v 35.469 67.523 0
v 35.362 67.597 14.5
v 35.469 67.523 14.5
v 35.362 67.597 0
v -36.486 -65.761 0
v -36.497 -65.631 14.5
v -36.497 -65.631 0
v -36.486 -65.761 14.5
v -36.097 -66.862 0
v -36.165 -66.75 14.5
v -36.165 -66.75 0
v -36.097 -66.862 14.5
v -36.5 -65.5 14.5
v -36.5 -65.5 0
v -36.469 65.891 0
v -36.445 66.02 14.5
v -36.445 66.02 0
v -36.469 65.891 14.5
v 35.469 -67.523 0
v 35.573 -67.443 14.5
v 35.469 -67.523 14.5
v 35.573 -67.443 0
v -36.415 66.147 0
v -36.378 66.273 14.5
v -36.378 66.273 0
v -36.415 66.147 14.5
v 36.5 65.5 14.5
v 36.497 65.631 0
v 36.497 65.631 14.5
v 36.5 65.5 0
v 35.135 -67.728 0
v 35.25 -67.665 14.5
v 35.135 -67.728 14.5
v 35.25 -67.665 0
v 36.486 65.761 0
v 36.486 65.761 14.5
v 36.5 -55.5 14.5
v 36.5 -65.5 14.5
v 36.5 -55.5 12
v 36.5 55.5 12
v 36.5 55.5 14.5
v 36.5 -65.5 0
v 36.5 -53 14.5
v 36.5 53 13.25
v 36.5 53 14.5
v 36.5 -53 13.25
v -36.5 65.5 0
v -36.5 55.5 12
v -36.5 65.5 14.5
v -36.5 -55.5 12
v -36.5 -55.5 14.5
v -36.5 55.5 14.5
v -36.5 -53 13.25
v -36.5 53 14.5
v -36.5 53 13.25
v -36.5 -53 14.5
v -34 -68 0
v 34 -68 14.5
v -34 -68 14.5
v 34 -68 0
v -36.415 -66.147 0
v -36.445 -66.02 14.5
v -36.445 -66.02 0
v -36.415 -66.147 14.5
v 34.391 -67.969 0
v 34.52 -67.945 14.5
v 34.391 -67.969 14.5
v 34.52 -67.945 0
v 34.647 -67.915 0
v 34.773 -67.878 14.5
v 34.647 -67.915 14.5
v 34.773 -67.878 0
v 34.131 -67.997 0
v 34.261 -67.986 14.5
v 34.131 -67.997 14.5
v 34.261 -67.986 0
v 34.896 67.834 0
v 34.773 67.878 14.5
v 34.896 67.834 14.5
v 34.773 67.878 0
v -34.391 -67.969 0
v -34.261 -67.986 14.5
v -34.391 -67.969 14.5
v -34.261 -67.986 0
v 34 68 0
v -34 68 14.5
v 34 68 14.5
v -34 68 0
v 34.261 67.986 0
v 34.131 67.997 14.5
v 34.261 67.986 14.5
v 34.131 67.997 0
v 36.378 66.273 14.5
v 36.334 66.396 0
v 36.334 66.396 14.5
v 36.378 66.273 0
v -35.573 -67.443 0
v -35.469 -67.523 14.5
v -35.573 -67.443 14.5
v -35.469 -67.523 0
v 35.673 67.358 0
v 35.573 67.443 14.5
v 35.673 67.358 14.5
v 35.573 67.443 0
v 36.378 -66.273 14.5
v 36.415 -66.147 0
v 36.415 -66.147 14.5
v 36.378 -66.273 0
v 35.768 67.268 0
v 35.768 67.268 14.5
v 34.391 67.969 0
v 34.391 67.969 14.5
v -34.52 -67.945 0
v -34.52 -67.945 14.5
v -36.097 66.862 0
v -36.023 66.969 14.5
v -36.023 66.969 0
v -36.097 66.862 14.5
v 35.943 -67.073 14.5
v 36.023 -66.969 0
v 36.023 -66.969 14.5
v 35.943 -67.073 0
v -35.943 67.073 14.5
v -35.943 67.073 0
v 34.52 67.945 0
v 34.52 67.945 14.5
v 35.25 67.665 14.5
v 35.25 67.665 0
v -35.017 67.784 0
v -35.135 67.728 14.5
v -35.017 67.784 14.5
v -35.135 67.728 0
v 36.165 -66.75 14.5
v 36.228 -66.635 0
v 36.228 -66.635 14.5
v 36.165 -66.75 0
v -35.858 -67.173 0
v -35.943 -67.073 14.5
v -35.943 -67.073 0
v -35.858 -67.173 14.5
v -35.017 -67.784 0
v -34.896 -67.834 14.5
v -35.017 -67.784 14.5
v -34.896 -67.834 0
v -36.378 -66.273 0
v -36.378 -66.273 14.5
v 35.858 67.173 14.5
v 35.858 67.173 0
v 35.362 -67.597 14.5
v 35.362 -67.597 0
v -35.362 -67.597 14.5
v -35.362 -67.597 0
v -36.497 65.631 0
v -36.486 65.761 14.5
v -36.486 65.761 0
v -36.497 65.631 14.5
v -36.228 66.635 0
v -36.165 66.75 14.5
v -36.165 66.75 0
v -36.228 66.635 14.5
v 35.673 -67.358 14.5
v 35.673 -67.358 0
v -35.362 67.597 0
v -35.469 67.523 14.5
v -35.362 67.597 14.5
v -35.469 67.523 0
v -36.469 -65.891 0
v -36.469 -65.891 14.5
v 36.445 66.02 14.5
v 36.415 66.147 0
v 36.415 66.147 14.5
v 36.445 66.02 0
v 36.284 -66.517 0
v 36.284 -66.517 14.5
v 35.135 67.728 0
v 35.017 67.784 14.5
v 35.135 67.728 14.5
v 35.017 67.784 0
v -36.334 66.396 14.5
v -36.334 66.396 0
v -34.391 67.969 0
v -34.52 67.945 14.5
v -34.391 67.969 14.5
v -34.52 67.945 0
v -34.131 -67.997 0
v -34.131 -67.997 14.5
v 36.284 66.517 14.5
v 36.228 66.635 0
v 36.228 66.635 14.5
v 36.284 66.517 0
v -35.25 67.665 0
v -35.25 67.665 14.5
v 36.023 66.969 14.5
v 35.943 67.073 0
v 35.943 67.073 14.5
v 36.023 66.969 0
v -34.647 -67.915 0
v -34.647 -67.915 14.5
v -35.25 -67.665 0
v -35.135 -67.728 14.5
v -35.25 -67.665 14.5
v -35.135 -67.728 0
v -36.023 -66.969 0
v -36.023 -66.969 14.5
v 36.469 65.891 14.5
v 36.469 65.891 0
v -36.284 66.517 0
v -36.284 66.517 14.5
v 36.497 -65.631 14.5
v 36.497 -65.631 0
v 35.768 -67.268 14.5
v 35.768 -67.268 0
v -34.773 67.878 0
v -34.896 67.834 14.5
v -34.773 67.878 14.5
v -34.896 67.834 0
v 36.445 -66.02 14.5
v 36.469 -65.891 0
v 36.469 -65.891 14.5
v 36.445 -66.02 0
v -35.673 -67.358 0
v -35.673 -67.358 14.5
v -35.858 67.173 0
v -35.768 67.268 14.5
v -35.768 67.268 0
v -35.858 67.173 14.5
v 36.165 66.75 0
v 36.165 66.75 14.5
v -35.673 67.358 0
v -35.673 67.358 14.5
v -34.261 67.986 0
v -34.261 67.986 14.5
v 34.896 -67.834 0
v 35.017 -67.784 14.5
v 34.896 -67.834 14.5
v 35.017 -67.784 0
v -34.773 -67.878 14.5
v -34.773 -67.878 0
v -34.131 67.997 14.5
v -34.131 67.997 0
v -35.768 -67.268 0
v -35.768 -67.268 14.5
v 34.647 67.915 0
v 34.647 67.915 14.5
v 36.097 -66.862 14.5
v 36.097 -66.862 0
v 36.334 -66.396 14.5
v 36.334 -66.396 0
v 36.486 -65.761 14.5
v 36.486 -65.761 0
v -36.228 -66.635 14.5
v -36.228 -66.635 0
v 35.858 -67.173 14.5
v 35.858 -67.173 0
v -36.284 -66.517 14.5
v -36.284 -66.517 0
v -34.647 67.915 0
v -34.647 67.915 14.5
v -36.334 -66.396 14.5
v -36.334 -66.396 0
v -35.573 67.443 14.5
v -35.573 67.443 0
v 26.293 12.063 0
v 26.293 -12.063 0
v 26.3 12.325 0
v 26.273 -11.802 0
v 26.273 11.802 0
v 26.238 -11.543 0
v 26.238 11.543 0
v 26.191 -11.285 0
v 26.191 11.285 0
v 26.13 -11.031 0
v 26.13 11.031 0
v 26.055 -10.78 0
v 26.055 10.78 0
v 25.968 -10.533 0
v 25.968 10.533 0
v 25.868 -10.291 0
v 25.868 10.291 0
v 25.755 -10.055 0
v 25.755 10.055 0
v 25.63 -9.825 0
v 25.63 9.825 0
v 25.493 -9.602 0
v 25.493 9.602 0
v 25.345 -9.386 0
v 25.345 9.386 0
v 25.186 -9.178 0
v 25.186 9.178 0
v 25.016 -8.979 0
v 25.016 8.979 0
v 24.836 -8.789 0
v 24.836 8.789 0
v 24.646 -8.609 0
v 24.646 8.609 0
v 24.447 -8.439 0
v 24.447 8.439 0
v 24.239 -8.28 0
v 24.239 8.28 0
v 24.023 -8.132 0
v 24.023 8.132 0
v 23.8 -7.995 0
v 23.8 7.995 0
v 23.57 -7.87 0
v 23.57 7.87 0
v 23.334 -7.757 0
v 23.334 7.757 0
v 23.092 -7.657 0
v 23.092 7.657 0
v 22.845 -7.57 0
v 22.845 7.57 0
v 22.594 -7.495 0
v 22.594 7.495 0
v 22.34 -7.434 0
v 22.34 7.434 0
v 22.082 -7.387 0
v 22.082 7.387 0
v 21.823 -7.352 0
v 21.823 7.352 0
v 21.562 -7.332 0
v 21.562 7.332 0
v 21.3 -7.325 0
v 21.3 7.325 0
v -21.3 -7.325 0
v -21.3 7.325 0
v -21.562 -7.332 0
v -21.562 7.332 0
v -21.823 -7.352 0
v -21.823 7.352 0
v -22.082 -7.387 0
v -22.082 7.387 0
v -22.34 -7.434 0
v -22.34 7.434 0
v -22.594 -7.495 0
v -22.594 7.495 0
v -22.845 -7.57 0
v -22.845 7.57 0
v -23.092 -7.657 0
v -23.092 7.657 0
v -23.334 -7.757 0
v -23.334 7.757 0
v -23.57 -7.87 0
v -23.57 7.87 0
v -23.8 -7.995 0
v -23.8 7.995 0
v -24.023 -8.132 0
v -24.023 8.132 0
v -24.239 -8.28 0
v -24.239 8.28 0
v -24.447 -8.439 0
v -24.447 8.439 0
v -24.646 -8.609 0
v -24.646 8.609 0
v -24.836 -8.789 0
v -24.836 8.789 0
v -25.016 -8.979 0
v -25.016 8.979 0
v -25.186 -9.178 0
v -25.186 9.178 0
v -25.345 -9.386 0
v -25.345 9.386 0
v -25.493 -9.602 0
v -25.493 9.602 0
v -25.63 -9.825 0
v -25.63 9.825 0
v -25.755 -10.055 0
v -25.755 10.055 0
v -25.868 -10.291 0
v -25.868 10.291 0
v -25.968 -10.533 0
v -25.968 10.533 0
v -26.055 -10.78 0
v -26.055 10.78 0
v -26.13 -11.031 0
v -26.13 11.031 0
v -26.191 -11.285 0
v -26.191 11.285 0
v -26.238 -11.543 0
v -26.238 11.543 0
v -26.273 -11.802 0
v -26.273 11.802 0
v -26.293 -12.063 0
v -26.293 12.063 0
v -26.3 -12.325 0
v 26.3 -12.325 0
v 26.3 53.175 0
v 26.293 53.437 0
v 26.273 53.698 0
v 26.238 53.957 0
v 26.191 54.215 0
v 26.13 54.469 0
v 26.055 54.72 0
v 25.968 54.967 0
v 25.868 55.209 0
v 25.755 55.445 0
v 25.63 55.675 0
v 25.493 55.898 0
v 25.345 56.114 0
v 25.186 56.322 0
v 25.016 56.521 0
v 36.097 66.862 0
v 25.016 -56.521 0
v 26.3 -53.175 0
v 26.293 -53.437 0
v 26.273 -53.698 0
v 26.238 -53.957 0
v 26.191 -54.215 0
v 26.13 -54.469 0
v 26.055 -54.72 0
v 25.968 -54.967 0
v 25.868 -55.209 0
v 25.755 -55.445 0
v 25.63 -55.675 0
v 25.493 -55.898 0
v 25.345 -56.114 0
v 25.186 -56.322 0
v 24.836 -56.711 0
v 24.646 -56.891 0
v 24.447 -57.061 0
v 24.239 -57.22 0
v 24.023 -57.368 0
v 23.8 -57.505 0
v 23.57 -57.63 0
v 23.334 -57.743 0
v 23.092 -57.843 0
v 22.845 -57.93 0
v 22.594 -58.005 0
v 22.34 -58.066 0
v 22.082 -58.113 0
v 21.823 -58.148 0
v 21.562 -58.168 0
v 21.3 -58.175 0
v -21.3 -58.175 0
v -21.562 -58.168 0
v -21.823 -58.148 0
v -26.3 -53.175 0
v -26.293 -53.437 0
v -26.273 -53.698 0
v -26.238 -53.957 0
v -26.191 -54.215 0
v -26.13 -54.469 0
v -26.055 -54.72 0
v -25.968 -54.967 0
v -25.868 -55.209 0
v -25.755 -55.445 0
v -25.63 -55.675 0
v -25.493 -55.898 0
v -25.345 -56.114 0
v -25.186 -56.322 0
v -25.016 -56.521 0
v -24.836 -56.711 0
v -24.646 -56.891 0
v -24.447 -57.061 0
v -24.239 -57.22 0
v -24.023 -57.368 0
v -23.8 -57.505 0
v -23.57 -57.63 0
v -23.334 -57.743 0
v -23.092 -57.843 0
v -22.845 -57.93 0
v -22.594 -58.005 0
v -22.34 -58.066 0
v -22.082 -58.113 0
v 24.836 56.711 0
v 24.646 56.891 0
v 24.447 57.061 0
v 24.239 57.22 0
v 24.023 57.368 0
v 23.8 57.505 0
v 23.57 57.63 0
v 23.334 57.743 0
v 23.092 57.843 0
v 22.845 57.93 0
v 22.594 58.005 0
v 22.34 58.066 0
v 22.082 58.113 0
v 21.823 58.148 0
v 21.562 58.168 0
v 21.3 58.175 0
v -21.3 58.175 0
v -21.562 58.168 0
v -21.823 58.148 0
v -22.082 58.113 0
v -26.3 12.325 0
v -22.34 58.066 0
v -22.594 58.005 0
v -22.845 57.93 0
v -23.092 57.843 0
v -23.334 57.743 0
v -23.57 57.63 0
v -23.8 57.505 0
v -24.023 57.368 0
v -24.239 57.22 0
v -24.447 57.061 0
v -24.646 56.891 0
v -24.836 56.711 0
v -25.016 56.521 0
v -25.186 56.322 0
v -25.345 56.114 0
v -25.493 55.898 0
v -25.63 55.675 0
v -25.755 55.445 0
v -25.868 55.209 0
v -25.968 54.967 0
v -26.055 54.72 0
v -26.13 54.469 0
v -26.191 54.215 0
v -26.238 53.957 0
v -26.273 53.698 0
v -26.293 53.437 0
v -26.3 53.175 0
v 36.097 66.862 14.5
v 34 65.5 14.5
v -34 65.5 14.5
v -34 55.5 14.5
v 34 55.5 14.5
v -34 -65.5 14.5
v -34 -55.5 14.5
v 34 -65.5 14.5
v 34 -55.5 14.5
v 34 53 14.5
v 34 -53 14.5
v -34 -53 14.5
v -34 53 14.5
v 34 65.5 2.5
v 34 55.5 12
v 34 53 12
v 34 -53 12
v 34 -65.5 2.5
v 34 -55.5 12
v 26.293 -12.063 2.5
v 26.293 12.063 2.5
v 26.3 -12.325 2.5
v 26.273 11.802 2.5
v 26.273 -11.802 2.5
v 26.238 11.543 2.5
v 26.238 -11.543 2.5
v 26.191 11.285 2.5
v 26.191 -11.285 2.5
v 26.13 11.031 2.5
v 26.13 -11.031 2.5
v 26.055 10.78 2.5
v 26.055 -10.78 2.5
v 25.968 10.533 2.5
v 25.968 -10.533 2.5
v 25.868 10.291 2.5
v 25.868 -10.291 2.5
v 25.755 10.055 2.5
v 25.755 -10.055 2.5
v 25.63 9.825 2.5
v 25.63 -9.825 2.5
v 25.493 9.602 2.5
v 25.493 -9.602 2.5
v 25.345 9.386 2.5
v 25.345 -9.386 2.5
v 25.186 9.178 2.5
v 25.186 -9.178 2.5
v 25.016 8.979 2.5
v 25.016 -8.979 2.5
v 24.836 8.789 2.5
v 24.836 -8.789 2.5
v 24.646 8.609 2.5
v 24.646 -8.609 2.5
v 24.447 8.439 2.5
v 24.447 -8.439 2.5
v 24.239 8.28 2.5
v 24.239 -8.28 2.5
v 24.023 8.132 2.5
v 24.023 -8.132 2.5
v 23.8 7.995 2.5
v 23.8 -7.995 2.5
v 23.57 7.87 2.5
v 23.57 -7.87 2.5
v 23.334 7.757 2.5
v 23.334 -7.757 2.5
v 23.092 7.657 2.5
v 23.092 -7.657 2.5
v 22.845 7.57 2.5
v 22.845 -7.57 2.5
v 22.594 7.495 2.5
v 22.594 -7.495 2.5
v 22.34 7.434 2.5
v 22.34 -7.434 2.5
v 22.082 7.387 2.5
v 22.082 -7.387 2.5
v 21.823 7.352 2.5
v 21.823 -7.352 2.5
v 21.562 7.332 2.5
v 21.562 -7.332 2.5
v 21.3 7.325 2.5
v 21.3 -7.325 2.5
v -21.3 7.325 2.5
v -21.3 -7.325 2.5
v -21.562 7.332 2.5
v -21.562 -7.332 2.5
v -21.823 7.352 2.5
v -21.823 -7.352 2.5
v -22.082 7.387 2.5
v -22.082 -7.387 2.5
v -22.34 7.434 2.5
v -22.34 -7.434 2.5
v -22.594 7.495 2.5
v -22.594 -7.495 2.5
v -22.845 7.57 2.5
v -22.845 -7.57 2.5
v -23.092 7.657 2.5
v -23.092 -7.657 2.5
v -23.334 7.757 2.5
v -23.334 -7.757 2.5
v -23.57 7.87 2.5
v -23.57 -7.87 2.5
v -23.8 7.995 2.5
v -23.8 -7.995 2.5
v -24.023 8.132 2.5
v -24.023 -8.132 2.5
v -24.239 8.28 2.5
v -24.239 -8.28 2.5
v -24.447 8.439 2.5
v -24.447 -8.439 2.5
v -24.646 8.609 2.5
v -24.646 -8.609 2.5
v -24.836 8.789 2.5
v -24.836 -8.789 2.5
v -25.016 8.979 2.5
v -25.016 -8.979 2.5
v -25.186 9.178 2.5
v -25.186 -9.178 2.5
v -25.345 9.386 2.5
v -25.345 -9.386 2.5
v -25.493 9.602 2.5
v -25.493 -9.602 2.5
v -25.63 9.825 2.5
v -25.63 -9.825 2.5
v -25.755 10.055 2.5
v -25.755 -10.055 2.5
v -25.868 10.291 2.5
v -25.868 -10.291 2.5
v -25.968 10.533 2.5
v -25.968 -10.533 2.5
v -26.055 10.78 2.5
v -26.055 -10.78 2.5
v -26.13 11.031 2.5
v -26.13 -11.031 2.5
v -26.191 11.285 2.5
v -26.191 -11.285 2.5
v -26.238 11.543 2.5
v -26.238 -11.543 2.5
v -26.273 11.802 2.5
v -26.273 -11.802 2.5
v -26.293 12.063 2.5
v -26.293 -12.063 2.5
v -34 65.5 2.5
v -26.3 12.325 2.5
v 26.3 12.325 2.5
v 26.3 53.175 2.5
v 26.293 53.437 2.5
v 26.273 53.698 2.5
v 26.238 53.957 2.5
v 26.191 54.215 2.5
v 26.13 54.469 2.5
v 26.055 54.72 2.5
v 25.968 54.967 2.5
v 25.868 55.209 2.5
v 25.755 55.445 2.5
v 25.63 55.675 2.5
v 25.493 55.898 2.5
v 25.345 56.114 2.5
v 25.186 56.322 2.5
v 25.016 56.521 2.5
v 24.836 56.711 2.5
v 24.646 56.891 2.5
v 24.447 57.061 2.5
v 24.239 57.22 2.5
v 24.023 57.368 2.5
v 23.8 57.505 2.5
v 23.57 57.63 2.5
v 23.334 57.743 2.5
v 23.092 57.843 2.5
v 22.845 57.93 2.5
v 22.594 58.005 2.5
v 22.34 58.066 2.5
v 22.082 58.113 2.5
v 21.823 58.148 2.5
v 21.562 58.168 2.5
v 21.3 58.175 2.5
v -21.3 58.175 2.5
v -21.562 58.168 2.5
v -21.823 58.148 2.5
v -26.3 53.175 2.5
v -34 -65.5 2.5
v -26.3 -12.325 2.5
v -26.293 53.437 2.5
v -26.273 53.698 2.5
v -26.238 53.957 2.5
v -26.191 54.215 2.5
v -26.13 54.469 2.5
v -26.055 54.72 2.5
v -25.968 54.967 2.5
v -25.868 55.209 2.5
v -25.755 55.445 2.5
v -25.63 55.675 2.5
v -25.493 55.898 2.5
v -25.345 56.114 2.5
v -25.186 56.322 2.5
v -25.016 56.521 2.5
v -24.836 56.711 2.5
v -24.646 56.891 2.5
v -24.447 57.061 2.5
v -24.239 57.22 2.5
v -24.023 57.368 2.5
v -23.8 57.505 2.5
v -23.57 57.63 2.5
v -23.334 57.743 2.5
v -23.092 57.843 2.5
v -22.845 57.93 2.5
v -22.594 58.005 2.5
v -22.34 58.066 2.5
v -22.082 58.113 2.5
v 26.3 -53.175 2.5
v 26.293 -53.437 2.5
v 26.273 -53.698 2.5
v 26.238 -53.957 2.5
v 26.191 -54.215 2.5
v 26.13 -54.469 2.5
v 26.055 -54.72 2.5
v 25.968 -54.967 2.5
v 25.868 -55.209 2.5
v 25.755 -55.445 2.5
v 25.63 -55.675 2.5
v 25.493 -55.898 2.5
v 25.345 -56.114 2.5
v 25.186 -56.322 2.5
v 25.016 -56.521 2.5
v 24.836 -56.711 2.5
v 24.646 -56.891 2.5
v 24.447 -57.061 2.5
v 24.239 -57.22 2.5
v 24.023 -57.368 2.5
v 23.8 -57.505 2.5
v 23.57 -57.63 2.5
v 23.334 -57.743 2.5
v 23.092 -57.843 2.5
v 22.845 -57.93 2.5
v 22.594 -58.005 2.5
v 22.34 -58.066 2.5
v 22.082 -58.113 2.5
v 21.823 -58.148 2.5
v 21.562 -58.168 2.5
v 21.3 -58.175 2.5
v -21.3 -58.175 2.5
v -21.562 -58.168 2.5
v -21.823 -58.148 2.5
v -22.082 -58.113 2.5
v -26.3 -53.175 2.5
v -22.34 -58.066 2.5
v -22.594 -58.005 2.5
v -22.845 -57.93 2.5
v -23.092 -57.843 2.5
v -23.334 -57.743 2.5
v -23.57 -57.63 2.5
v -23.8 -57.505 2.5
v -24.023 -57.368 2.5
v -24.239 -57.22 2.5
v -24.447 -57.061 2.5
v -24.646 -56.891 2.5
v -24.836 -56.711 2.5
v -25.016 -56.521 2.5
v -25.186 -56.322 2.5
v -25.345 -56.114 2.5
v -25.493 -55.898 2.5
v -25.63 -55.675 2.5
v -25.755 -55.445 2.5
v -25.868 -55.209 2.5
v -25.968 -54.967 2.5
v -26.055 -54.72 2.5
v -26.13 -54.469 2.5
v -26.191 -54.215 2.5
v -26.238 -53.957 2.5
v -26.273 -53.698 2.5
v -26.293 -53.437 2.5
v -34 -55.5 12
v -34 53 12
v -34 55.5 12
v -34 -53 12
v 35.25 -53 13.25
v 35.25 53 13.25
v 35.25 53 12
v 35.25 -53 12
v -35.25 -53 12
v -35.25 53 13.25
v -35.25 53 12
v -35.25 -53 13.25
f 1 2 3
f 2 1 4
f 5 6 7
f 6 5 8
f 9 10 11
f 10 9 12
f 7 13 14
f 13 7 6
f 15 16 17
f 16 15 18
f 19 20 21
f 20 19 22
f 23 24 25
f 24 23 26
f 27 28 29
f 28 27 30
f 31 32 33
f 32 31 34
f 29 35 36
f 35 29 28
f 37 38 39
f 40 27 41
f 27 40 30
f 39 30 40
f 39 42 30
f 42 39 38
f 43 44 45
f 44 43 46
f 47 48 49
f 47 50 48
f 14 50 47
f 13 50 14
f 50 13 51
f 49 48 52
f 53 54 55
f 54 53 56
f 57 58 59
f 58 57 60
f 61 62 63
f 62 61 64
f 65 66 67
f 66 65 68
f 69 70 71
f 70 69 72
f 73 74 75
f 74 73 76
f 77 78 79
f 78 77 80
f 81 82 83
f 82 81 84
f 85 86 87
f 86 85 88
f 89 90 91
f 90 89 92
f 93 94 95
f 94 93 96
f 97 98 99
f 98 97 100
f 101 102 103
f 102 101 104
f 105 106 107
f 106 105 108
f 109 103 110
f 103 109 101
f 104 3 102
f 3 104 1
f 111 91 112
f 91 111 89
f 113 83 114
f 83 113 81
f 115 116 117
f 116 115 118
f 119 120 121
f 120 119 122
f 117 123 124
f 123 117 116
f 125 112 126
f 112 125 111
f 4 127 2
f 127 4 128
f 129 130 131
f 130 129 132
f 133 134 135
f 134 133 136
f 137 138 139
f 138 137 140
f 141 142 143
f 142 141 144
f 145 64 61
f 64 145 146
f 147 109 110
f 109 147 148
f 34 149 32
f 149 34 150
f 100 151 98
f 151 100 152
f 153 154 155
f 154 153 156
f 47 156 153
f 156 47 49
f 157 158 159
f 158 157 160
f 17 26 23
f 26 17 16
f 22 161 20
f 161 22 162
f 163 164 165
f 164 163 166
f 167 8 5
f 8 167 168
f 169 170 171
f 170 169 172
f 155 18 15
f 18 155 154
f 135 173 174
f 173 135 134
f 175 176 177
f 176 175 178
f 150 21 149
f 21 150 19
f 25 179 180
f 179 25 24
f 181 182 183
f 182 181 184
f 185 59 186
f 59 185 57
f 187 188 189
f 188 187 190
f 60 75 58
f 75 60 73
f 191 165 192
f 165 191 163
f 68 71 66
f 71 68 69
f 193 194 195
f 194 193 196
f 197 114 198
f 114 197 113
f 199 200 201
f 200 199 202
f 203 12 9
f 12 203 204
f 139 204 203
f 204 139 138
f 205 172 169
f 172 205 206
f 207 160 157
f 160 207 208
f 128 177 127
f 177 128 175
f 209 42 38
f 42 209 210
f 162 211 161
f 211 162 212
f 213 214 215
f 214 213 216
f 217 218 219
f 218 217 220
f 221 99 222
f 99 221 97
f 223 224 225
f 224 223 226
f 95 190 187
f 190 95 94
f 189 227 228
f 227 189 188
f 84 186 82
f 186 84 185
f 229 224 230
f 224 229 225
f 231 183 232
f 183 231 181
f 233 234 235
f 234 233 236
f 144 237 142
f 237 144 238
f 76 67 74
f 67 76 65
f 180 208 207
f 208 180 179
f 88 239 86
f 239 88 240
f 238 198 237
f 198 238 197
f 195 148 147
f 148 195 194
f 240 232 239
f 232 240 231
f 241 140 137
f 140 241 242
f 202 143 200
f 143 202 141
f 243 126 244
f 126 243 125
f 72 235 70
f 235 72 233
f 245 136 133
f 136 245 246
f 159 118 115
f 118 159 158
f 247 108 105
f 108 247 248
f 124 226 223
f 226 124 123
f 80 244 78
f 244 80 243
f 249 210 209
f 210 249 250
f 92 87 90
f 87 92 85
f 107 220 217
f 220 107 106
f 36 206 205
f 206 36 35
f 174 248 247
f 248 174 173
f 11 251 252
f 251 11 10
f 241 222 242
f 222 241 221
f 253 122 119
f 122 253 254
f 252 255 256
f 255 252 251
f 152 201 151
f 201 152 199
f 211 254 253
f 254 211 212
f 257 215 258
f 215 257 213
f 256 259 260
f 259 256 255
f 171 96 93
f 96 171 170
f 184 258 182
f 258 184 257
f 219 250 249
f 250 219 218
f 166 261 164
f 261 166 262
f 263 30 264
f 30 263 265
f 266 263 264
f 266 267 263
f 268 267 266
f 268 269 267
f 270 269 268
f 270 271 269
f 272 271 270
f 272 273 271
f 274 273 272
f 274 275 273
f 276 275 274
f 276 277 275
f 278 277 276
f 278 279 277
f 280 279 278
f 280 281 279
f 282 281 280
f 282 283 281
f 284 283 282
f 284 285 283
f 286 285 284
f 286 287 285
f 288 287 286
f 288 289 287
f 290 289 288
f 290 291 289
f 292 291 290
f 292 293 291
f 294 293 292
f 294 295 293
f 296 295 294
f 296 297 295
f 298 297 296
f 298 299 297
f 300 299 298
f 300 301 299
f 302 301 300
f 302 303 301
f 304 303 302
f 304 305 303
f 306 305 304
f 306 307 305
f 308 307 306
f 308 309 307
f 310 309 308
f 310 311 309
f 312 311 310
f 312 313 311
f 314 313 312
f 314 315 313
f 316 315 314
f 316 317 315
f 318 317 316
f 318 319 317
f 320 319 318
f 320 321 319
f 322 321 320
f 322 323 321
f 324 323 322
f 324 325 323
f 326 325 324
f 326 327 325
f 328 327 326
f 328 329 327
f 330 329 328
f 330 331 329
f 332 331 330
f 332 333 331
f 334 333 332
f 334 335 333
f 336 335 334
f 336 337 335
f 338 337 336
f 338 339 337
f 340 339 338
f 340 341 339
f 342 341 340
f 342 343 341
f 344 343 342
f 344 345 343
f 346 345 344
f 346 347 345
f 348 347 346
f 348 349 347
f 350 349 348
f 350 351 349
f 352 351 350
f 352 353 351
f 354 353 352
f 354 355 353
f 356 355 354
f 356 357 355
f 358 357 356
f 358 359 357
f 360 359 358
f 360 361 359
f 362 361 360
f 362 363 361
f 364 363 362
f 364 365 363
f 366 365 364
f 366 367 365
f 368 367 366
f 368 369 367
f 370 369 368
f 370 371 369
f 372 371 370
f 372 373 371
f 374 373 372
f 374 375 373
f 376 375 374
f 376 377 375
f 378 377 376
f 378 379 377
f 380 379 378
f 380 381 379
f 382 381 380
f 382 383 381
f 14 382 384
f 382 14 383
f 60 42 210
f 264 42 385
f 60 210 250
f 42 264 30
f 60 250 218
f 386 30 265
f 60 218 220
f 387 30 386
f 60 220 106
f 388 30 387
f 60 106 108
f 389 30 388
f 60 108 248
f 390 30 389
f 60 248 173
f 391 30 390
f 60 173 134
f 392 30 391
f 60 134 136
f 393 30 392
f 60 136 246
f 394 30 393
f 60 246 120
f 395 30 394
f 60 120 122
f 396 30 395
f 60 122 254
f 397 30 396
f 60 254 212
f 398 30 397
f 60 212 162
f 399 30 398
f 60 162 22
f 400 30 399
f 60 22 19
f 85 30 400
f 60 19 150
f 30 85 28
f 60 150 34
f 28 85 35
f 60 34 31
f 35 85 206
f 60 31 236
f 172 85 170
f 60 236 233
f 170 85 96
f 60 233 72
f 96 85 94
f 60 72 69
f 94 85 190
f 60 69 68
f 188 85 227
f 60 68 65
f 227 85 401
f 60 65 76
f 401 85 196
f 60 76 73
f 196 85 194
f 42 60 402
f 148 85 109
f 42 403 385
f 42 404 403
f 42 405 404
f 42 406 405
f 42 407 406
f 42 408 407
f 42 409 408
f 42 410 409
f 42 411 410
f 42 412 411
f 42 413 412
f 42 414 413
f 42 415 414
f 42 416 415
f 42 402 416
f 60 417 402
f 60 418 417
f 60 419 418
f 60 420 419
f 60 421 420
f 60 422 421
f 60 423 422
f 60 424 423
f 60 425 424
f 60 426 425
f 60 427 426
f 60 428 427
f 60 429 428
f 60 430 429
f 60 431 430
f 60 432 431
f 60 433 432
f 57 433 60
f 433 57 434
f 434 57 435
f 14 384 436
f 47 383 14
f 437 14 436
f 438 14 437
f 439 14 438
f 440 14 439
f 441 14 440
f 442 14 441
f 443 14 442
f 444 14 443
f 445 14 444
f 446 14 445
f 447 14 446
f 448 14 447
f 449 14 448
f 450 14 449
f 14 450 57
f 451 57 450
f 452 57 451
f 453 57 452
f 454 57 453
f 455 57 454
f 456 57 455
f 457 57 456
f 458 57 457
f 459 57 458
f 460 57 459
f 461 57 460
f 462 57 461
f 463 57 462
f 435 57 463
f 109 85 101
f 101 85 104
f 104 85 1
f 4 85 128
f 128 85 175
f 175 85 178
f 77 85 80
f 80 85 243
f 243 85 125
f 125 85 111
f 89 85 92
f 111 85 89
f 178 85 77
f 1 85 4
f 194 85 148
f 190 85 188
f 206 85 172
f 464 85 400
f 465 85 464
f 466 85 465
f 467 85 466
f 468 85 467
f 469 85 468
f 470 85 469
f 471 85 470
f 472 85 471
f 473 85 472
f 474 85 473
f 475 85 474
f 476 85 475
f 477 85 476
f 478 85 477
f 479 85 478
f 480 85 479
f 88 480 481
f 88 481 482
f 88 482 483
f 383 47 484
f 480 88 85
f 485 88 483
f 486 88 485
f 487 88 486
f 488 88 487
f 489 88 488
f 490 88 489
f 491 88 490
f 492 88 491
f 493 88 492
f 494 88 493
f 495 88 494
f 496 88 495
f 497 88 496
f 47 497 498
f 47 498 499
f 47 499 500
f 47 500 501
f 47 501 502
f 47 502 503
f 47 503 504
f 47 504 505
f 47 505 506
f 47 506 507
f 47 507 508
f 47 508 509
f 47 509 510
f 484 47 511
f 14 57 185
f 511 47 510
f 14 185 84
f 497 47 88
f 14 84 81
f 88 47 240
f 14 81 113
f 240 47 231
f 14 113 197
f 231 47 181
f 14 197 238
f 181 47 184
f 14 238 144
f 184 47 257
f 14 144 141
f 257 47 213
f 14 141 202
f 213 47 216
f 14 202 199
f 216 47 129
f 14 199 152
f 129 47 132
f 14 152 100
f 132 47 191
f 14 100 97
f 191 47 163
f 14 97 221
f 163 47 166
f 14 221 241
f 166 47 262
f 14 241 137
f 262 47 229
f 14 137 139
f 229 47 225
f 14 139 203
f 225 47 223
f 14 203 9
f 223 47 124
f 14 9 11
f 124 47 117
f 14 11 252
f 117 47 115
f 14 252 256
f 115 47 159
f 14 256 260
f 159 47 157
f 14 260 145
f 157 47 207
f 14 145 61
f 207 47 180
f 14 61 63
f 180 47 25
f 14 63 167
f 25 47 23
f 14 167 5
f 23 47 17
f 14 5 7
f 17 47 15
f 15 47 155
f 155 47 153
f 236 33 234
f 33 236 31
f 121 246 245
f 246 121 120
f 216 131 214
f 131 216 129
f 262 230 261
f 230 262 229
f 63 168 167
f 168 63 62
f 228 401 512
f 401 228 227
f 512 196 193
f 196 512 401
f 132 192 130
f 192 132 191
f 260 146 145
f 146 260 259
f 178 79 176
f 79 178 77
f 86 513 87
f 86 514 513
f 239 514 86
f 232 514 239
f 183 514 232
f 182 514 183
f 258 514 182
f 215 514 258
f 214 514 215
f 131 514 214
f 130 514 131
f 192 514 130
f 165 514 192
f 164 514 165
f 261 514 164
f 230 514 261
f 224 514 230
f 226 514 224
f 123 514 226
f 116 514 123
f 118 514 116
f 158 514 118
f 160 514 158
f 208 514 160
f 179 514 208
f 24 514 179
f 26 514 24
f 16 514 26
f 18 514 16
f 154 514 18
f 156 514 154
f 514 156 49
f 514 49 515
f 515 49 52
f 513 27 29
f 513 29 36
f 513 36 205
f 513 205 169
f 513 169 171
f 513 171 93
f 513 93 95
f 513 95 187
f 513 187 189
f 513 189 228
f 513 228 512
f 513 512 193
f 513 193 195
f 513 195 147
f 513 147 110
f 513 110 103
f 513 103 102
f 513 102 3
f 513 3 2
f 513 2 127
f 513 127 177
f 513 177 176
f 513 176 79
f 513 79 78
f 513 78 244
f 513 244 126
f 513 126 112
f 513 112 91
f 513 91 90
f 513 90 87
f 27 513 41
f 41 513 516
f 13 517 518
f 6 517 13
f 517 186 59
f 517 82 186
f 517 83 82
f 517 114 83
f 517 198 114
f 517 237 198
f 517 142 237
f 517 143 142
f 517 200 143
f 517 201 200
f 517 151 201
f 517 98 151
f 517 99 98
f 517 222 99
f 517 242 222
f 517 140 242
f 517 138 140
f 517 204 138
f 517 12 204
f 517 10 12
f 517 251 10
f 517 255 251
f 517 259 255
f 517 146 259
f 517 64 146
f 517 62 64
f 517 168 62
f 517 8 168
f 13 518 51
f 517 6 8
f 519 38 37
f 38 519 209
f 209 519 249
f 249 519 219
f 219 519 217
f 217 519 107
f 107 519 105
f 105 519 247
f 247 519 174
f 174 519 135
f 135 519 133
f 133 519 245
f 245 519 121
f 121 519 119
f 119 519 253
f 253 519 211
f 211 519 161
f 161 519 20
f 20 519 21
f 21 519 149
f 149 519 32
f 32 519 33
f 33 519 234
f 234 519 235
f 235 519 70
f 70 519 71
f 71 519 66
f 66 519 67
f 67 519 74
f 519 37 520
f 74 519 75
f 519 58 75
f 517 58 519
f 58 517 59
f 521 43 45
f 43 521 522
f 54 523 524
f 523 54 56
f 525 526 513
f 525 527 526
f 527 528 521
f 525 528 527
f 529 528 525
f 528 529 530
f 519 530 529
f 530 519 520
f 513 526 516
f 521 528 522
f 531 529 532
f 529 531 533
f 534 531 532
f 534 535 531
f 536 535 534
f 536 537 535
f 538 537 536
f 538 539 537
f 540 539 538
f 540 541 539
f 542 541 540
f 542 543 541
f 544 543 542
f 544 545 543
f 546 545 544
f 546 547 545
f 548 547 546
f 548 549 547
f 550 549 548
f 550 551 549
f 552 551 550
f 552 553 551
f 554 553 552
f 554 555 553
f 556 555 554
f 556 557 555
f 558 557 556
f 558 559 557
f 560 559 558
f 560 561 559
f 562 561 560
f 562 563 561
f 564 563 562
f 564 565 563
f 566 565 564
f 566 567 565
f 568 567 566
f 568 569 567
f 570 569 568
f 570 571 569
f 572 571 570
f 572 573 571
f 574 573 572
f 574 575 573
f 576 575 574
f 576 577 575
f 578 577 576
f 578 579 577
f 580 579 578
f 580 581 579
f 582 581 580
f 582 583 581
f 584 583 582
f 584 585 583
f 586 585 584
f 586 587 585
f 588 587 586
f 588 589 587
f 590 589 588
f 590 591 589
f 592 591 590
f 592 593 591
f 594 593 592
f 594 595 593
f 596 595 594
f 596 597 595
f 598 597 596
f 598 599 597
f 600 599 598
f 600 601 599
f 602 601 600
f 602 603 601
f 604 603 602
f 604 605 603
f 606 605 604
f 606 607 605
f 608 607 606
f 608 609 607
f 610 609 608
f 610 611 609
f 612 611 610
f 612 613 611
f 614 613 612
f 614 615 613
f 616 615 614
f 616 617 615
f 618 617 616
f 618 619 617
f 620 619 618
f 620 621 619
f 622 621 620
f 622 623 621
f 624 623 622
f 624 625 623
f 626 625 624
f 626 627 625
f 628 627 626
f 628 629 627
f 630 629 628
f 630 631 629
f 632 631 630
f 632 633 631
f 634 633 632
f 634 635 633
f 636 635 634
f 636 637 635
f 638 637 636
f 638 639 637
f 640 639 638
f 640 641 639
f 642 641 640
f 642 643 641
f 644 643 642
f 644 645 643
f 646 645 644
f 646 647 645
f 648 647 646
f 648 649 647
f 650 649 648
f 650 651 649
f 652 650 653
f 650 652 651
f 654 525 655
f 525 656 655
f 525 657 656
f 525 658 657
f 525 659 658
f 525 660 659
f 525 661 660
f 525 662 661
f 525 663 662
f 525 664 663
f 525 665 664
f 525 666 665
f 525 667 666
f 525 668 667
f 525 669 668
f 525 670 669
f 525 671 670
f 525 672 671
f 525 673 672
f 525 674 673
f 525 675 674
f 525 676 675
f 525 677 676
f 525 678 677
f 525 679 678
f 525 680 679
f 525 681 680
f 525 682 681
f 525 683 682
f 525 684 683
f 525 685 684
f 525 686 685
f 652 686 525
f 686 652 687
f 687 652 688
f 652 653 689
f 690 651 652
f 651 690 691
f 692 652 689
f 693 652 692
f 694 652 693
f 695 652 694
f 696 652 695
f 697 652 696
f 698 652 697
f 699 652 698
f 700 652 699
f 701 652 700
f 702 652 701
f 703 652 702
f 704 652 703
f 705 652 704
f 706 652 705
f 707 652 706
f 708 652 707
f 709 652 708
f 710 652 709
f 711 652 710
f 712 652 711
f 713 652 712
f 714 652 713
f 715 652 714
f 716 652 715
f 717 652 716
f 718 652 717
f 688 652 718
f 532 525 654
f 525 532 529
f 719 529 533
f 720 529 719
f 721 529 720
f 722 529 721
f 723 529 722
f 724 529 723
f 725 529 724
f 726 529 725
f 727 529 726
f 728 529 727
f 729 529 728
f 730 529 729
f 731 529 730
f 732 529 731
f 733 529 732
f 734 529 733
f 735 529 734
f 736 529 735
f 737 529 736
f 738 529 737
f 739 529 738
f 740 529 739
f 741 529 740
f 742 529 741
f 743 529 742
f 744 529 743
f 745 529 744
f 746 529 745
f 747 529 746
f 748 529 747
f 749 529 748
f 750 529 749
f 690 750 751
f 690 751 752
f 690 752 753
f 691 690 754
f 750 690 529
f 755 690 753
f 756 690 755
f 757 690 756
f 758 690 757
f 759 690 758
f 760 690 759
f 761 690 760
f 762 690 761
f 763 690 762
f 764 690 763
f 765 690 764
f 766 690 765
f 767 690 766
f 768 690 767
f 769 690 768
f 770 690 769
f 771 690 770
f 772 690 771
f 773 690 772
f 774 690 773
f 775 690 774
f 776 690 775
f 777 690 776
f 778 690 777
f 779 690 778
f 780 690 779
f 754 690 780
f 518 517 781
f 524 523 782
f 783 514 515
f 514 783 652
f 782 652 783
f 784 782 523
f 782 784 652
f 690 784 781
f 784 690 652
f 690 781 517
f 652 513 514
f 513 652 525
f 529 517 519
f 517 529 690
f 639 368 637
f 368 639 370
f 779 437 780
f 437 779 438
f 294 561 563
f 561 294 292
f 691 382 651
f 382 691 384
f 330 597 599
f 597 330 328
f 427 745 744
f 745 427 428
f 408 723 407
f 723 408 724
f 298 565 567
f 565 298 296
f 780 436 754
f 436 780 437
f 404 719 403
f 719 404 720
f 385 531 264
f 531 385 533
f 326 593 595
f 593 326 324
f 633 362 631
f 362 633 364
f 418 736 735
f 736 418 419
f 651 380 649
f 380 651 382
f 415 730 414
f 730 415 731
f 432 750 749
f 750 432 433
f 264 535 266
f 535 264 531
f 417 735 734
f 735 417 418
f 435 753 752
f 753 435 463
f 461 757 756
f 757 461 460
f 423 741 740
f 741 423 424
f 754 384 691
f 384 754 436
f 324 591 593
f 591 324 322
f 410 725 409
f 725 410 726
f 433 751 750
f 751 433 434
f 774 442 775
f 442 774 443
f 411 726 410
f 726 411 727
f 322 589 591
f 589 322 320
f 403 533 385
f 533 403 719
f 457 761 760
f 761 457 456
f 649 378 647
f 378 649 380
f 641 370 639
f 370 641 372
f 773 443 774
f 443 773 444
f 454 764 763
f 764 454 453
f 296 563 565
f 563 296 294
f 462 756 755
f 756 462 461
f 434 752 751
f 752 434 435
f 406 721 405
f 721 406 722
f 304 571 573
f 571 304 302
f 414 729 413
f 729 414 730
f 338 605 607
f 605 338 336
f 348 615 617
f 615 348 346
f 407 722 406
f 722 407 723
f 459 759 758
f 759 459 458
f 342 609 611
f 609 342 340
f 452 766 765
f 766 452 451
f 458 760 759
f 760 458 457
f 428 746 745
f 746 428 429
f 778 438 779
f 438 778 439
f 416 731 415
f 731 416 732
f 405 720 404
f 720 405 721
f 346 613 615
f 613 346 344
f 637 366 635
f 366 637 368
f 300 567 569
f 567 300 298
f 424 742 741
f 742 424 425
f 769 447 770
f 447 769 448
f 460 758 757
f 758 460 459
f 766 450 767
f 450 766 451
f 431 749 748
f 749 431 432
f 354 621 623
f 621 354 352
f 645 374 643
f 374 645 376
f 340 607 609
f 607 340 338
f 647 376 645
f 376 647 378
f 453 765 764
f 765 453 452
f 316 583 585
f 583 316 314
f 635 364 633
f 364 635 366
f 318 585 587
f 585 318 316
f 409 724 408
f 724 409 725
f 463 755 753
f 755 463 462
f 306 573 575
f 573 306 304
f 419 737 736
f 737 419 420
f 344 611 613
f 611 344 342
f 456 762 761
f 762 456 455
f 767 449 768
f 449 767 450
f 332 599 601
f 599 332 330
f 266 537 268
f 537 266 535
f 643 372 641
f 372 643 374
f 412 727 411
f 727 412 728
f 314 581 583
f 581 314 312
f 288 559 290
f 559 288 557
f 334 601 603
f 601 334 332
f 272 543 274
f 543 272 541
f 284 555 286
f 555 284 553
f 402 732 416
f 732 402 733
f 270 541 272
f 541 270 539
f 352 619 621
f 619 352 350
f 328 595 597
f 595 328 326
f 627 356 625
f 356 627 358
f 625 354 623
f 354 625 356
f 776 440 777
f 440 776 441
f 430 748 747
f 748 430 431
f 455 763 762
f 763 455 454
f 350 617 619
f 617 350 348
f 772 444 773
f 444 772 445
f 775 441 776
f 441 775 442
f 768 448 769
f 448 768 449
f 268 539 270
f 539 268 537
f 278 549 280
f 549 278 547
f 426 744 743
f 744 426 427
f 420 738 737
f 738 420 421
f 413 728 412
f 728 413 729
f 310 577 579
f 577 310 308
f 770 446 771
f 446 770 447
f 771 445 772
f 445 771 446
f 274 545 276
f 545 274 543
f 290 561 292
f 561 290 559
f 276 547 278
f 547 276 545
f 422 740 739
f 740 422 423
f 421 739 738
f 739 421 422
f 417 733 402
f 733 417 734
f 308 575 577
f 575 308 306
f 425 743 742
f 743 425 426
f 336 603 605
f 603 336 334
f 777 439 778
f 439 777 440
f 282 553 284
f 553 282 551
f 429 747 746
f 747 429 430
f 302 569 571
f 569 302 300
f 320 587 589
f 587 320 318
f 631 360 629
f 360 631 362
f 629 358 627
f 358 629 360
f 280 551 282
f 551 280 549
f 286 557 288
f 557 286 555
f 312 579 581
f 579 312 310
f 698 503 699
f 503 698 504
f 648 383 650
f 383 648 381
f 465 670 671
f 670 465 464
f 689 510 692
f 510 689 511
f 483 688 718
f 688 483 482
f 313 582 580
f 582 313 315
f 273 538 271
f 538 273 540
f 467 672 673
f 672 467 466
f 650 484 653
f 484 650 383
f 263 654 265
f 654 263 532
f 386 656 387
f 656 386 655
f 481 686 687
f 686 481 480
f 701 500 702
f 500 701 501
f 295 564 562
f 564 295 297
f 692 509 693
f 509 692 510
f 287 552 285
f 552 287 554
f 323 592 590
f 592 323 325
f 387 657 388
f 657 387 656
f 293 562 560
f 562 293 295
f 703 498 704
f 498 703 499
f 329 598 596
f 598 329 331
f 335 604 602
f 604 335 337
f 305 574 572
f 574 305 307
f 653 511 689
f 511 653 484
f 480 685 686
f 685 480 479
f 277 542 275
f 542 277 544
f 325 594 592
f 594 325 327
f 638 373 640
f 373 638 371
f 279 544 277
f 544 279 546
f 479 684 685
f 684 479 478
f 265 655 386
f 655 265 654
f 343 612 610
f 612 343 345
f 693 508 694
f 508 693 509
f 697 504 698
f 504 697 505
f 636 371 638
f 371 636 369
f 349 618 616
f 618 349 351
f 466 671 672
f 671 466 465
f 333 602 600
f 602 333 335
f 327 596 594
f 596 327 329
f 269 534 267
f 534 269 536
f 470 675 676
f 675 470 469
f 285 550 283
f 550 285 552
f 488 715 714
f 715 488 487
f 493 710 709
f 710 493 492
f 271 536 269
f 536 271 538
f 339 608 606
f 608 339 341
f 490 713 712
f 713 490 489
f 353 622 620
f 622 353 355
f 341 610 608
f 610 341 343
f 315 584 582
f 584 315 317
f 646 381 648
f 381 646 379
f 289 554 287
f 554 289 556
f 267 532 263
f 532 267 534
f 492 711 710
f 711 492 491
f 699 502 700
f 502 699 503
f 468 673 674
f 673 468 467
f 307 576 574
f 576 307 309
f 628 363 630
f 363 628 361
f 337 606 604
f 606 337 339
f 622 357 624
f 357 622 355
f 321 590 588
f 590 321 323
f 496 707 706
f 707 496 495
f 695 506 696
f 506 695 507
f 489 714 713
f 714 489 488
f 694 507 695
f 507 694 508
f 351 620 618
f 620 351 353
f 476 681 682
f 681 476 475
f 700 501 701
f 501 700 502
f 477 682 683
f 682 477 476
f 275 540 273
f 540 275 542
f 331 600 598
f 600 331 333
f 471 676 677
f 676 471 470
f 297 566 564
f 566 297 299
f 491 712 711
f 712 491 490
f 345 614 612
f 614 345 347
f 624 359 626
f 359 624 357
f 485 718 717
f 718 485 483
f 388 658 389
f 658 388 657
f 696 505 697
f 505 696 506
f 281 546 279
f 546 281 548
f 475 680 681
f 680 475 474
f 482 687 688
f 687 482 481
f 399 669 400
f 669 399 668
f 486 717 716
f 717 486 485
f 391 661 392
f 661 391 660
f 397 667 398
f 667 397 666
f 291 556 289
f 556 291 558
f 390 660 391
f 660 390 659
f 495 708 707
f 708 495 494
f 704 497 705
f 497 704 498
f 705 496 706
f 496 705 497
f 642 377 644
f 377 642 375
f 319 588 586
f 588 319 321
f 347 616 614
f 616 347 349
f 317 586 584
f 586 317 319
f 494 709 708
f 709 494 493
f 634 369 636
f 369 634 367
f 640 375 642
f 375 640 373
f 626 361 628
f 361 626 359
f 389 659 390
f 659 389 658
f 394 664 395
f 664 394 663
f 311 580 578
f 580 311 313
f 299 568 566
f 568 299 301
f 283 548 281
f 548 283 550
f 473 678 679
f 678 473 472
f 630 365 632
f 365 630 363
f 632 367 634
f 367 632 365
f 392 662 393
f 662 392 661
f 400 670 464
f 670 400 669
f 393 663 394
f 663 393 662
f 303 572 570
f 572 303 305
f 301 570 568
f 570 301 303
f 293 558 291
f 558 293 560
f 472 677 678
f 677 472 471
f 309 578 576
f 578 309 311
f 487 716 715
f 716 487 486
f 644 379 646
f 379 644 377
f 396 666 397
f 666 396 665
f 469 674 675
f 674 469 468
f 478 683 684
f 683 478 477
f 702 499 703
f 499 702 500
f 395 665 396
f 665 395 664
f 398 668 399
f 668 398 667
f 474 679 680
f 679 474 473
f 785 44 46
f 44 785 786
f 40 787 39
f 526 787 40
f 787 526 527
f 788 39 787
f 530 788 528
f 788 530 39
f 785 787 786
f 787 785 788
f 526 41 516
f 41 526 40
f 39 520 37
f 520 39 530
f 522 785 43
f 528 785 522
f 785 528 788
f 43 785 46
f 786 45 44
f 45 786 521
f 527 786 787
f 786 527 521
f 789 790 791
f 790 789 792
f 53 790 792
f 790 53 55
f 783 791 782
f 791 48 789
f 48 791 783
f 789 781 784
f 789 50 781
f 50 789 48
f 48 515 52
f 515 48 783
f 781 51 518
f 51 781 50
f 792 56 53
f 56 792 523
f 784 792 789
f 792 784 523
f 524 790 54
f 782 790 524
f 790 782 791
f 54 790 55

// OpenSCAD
part = "frame"; // [base:Support base,frame:Support frame]

// Cellphone Width (Moto G, 68mm)
width = 68; // [1:150]

// Cellphone Height (Moto G, 131mm)
height= 131; // [1:200]

// Cellphone Depth (Moto G, 12mm)
depth = 12; // [1:100]

// Border Thickness
border_thickness=2.5; // [2:0.5:10]

/* [Hidden] */

$fn=120;

print_part();

module print_part() {
	if (part == "base") {
		base(width);
	} else if (part == "frame") {
        box(width,height,depth,border_thickness);
	}
}

module frame(width, height, depth, border)
{   
    difference()
    {
        roundedRect([width+border,height+border,depth+border],border);

        translate([0,0,(depth/2)+border])
        cube([width,height,depth],center=true);        
    }
}

module sideStuff(width, height, depth, border)
{
            translate([(width/2)+border*0.75,0,depth+border*0.25])
            cube([border/2,height-20,border/2],center=true);

            translate([(width/2)+border/2,-(height-(20+border))/2,depth+border/2])
            cube([border,border,border],center=true);

            translate([(width/2)+border/2,(height-(20+border))/2,depth+border/2])
            cube([border,border,border],center=true);

            translate([-((width/2)+border*0.75),0,depth+border*0.25])
            cube([border/2,height-20,border/2],center=true);

            translate([-((width/2)+border/2),-(height-(20+border))/2,depth+border/2])
            cube([border,border,border],center=true);

            translate([-((width/2)+border/2),(height-(20+border))/2,depth+border/2])
            cube([border,border,border],center=true);

}

// size - [x,y,z]
// radius - radius of corners
module roundedRect(size, radius)
{
	x = size[0];
	y = size[1];
	z = size[2];

	linear_extrude(height=z)
	hull()
	{
		// place 4 circles in the corners, with the given radius
		translate([(-x/2)+(radius/2), (-y/2)+(radius/2), 0])
		circle(r=radius);
	
		translate([(x/2)-(radius/2), (-y/2)+(radius/2), 0])
		circle(r=radius);
	
		translate([(-x/2)+(radius/2), (y/2)-(radius/2), 0])
		circle(r=radius);
	
		translate([(x/2)-(radius/2), (y/2)-(radius/2), 0])
		circle(r=radius);
	}
}


module innerHoles(width, height, depth, border)
{
            translate([0,-height/4,0])
            roundedRect([width*0.7,height*0.35,depth+border],5);

            translate([0,height/4,0])
            roundedRect([width*0.7,height*0.35,depth+border],5);
}

module box(width, height, depth, border)
{
    difference()
    {
        frame(width, height, depth, border);
        union()
        {
            innerHoles(width, height, depth, border);
            sideStuff(width, height, depth, border);
        }
    }
}


module base(width)
{
    translate([0,0,-5])
    {        
        rotate([0,0,90])
        difference()
        {
        cube([30,width,10],center=true);
            union()
            {
                translate([0,0,-29])
                    rotate([90,90,0])
                        cylinder(h=width,r=30,center=true);            
                translate([0,0,3])
                cube([30,27,3], center=true);
            }
        }
    }
}
